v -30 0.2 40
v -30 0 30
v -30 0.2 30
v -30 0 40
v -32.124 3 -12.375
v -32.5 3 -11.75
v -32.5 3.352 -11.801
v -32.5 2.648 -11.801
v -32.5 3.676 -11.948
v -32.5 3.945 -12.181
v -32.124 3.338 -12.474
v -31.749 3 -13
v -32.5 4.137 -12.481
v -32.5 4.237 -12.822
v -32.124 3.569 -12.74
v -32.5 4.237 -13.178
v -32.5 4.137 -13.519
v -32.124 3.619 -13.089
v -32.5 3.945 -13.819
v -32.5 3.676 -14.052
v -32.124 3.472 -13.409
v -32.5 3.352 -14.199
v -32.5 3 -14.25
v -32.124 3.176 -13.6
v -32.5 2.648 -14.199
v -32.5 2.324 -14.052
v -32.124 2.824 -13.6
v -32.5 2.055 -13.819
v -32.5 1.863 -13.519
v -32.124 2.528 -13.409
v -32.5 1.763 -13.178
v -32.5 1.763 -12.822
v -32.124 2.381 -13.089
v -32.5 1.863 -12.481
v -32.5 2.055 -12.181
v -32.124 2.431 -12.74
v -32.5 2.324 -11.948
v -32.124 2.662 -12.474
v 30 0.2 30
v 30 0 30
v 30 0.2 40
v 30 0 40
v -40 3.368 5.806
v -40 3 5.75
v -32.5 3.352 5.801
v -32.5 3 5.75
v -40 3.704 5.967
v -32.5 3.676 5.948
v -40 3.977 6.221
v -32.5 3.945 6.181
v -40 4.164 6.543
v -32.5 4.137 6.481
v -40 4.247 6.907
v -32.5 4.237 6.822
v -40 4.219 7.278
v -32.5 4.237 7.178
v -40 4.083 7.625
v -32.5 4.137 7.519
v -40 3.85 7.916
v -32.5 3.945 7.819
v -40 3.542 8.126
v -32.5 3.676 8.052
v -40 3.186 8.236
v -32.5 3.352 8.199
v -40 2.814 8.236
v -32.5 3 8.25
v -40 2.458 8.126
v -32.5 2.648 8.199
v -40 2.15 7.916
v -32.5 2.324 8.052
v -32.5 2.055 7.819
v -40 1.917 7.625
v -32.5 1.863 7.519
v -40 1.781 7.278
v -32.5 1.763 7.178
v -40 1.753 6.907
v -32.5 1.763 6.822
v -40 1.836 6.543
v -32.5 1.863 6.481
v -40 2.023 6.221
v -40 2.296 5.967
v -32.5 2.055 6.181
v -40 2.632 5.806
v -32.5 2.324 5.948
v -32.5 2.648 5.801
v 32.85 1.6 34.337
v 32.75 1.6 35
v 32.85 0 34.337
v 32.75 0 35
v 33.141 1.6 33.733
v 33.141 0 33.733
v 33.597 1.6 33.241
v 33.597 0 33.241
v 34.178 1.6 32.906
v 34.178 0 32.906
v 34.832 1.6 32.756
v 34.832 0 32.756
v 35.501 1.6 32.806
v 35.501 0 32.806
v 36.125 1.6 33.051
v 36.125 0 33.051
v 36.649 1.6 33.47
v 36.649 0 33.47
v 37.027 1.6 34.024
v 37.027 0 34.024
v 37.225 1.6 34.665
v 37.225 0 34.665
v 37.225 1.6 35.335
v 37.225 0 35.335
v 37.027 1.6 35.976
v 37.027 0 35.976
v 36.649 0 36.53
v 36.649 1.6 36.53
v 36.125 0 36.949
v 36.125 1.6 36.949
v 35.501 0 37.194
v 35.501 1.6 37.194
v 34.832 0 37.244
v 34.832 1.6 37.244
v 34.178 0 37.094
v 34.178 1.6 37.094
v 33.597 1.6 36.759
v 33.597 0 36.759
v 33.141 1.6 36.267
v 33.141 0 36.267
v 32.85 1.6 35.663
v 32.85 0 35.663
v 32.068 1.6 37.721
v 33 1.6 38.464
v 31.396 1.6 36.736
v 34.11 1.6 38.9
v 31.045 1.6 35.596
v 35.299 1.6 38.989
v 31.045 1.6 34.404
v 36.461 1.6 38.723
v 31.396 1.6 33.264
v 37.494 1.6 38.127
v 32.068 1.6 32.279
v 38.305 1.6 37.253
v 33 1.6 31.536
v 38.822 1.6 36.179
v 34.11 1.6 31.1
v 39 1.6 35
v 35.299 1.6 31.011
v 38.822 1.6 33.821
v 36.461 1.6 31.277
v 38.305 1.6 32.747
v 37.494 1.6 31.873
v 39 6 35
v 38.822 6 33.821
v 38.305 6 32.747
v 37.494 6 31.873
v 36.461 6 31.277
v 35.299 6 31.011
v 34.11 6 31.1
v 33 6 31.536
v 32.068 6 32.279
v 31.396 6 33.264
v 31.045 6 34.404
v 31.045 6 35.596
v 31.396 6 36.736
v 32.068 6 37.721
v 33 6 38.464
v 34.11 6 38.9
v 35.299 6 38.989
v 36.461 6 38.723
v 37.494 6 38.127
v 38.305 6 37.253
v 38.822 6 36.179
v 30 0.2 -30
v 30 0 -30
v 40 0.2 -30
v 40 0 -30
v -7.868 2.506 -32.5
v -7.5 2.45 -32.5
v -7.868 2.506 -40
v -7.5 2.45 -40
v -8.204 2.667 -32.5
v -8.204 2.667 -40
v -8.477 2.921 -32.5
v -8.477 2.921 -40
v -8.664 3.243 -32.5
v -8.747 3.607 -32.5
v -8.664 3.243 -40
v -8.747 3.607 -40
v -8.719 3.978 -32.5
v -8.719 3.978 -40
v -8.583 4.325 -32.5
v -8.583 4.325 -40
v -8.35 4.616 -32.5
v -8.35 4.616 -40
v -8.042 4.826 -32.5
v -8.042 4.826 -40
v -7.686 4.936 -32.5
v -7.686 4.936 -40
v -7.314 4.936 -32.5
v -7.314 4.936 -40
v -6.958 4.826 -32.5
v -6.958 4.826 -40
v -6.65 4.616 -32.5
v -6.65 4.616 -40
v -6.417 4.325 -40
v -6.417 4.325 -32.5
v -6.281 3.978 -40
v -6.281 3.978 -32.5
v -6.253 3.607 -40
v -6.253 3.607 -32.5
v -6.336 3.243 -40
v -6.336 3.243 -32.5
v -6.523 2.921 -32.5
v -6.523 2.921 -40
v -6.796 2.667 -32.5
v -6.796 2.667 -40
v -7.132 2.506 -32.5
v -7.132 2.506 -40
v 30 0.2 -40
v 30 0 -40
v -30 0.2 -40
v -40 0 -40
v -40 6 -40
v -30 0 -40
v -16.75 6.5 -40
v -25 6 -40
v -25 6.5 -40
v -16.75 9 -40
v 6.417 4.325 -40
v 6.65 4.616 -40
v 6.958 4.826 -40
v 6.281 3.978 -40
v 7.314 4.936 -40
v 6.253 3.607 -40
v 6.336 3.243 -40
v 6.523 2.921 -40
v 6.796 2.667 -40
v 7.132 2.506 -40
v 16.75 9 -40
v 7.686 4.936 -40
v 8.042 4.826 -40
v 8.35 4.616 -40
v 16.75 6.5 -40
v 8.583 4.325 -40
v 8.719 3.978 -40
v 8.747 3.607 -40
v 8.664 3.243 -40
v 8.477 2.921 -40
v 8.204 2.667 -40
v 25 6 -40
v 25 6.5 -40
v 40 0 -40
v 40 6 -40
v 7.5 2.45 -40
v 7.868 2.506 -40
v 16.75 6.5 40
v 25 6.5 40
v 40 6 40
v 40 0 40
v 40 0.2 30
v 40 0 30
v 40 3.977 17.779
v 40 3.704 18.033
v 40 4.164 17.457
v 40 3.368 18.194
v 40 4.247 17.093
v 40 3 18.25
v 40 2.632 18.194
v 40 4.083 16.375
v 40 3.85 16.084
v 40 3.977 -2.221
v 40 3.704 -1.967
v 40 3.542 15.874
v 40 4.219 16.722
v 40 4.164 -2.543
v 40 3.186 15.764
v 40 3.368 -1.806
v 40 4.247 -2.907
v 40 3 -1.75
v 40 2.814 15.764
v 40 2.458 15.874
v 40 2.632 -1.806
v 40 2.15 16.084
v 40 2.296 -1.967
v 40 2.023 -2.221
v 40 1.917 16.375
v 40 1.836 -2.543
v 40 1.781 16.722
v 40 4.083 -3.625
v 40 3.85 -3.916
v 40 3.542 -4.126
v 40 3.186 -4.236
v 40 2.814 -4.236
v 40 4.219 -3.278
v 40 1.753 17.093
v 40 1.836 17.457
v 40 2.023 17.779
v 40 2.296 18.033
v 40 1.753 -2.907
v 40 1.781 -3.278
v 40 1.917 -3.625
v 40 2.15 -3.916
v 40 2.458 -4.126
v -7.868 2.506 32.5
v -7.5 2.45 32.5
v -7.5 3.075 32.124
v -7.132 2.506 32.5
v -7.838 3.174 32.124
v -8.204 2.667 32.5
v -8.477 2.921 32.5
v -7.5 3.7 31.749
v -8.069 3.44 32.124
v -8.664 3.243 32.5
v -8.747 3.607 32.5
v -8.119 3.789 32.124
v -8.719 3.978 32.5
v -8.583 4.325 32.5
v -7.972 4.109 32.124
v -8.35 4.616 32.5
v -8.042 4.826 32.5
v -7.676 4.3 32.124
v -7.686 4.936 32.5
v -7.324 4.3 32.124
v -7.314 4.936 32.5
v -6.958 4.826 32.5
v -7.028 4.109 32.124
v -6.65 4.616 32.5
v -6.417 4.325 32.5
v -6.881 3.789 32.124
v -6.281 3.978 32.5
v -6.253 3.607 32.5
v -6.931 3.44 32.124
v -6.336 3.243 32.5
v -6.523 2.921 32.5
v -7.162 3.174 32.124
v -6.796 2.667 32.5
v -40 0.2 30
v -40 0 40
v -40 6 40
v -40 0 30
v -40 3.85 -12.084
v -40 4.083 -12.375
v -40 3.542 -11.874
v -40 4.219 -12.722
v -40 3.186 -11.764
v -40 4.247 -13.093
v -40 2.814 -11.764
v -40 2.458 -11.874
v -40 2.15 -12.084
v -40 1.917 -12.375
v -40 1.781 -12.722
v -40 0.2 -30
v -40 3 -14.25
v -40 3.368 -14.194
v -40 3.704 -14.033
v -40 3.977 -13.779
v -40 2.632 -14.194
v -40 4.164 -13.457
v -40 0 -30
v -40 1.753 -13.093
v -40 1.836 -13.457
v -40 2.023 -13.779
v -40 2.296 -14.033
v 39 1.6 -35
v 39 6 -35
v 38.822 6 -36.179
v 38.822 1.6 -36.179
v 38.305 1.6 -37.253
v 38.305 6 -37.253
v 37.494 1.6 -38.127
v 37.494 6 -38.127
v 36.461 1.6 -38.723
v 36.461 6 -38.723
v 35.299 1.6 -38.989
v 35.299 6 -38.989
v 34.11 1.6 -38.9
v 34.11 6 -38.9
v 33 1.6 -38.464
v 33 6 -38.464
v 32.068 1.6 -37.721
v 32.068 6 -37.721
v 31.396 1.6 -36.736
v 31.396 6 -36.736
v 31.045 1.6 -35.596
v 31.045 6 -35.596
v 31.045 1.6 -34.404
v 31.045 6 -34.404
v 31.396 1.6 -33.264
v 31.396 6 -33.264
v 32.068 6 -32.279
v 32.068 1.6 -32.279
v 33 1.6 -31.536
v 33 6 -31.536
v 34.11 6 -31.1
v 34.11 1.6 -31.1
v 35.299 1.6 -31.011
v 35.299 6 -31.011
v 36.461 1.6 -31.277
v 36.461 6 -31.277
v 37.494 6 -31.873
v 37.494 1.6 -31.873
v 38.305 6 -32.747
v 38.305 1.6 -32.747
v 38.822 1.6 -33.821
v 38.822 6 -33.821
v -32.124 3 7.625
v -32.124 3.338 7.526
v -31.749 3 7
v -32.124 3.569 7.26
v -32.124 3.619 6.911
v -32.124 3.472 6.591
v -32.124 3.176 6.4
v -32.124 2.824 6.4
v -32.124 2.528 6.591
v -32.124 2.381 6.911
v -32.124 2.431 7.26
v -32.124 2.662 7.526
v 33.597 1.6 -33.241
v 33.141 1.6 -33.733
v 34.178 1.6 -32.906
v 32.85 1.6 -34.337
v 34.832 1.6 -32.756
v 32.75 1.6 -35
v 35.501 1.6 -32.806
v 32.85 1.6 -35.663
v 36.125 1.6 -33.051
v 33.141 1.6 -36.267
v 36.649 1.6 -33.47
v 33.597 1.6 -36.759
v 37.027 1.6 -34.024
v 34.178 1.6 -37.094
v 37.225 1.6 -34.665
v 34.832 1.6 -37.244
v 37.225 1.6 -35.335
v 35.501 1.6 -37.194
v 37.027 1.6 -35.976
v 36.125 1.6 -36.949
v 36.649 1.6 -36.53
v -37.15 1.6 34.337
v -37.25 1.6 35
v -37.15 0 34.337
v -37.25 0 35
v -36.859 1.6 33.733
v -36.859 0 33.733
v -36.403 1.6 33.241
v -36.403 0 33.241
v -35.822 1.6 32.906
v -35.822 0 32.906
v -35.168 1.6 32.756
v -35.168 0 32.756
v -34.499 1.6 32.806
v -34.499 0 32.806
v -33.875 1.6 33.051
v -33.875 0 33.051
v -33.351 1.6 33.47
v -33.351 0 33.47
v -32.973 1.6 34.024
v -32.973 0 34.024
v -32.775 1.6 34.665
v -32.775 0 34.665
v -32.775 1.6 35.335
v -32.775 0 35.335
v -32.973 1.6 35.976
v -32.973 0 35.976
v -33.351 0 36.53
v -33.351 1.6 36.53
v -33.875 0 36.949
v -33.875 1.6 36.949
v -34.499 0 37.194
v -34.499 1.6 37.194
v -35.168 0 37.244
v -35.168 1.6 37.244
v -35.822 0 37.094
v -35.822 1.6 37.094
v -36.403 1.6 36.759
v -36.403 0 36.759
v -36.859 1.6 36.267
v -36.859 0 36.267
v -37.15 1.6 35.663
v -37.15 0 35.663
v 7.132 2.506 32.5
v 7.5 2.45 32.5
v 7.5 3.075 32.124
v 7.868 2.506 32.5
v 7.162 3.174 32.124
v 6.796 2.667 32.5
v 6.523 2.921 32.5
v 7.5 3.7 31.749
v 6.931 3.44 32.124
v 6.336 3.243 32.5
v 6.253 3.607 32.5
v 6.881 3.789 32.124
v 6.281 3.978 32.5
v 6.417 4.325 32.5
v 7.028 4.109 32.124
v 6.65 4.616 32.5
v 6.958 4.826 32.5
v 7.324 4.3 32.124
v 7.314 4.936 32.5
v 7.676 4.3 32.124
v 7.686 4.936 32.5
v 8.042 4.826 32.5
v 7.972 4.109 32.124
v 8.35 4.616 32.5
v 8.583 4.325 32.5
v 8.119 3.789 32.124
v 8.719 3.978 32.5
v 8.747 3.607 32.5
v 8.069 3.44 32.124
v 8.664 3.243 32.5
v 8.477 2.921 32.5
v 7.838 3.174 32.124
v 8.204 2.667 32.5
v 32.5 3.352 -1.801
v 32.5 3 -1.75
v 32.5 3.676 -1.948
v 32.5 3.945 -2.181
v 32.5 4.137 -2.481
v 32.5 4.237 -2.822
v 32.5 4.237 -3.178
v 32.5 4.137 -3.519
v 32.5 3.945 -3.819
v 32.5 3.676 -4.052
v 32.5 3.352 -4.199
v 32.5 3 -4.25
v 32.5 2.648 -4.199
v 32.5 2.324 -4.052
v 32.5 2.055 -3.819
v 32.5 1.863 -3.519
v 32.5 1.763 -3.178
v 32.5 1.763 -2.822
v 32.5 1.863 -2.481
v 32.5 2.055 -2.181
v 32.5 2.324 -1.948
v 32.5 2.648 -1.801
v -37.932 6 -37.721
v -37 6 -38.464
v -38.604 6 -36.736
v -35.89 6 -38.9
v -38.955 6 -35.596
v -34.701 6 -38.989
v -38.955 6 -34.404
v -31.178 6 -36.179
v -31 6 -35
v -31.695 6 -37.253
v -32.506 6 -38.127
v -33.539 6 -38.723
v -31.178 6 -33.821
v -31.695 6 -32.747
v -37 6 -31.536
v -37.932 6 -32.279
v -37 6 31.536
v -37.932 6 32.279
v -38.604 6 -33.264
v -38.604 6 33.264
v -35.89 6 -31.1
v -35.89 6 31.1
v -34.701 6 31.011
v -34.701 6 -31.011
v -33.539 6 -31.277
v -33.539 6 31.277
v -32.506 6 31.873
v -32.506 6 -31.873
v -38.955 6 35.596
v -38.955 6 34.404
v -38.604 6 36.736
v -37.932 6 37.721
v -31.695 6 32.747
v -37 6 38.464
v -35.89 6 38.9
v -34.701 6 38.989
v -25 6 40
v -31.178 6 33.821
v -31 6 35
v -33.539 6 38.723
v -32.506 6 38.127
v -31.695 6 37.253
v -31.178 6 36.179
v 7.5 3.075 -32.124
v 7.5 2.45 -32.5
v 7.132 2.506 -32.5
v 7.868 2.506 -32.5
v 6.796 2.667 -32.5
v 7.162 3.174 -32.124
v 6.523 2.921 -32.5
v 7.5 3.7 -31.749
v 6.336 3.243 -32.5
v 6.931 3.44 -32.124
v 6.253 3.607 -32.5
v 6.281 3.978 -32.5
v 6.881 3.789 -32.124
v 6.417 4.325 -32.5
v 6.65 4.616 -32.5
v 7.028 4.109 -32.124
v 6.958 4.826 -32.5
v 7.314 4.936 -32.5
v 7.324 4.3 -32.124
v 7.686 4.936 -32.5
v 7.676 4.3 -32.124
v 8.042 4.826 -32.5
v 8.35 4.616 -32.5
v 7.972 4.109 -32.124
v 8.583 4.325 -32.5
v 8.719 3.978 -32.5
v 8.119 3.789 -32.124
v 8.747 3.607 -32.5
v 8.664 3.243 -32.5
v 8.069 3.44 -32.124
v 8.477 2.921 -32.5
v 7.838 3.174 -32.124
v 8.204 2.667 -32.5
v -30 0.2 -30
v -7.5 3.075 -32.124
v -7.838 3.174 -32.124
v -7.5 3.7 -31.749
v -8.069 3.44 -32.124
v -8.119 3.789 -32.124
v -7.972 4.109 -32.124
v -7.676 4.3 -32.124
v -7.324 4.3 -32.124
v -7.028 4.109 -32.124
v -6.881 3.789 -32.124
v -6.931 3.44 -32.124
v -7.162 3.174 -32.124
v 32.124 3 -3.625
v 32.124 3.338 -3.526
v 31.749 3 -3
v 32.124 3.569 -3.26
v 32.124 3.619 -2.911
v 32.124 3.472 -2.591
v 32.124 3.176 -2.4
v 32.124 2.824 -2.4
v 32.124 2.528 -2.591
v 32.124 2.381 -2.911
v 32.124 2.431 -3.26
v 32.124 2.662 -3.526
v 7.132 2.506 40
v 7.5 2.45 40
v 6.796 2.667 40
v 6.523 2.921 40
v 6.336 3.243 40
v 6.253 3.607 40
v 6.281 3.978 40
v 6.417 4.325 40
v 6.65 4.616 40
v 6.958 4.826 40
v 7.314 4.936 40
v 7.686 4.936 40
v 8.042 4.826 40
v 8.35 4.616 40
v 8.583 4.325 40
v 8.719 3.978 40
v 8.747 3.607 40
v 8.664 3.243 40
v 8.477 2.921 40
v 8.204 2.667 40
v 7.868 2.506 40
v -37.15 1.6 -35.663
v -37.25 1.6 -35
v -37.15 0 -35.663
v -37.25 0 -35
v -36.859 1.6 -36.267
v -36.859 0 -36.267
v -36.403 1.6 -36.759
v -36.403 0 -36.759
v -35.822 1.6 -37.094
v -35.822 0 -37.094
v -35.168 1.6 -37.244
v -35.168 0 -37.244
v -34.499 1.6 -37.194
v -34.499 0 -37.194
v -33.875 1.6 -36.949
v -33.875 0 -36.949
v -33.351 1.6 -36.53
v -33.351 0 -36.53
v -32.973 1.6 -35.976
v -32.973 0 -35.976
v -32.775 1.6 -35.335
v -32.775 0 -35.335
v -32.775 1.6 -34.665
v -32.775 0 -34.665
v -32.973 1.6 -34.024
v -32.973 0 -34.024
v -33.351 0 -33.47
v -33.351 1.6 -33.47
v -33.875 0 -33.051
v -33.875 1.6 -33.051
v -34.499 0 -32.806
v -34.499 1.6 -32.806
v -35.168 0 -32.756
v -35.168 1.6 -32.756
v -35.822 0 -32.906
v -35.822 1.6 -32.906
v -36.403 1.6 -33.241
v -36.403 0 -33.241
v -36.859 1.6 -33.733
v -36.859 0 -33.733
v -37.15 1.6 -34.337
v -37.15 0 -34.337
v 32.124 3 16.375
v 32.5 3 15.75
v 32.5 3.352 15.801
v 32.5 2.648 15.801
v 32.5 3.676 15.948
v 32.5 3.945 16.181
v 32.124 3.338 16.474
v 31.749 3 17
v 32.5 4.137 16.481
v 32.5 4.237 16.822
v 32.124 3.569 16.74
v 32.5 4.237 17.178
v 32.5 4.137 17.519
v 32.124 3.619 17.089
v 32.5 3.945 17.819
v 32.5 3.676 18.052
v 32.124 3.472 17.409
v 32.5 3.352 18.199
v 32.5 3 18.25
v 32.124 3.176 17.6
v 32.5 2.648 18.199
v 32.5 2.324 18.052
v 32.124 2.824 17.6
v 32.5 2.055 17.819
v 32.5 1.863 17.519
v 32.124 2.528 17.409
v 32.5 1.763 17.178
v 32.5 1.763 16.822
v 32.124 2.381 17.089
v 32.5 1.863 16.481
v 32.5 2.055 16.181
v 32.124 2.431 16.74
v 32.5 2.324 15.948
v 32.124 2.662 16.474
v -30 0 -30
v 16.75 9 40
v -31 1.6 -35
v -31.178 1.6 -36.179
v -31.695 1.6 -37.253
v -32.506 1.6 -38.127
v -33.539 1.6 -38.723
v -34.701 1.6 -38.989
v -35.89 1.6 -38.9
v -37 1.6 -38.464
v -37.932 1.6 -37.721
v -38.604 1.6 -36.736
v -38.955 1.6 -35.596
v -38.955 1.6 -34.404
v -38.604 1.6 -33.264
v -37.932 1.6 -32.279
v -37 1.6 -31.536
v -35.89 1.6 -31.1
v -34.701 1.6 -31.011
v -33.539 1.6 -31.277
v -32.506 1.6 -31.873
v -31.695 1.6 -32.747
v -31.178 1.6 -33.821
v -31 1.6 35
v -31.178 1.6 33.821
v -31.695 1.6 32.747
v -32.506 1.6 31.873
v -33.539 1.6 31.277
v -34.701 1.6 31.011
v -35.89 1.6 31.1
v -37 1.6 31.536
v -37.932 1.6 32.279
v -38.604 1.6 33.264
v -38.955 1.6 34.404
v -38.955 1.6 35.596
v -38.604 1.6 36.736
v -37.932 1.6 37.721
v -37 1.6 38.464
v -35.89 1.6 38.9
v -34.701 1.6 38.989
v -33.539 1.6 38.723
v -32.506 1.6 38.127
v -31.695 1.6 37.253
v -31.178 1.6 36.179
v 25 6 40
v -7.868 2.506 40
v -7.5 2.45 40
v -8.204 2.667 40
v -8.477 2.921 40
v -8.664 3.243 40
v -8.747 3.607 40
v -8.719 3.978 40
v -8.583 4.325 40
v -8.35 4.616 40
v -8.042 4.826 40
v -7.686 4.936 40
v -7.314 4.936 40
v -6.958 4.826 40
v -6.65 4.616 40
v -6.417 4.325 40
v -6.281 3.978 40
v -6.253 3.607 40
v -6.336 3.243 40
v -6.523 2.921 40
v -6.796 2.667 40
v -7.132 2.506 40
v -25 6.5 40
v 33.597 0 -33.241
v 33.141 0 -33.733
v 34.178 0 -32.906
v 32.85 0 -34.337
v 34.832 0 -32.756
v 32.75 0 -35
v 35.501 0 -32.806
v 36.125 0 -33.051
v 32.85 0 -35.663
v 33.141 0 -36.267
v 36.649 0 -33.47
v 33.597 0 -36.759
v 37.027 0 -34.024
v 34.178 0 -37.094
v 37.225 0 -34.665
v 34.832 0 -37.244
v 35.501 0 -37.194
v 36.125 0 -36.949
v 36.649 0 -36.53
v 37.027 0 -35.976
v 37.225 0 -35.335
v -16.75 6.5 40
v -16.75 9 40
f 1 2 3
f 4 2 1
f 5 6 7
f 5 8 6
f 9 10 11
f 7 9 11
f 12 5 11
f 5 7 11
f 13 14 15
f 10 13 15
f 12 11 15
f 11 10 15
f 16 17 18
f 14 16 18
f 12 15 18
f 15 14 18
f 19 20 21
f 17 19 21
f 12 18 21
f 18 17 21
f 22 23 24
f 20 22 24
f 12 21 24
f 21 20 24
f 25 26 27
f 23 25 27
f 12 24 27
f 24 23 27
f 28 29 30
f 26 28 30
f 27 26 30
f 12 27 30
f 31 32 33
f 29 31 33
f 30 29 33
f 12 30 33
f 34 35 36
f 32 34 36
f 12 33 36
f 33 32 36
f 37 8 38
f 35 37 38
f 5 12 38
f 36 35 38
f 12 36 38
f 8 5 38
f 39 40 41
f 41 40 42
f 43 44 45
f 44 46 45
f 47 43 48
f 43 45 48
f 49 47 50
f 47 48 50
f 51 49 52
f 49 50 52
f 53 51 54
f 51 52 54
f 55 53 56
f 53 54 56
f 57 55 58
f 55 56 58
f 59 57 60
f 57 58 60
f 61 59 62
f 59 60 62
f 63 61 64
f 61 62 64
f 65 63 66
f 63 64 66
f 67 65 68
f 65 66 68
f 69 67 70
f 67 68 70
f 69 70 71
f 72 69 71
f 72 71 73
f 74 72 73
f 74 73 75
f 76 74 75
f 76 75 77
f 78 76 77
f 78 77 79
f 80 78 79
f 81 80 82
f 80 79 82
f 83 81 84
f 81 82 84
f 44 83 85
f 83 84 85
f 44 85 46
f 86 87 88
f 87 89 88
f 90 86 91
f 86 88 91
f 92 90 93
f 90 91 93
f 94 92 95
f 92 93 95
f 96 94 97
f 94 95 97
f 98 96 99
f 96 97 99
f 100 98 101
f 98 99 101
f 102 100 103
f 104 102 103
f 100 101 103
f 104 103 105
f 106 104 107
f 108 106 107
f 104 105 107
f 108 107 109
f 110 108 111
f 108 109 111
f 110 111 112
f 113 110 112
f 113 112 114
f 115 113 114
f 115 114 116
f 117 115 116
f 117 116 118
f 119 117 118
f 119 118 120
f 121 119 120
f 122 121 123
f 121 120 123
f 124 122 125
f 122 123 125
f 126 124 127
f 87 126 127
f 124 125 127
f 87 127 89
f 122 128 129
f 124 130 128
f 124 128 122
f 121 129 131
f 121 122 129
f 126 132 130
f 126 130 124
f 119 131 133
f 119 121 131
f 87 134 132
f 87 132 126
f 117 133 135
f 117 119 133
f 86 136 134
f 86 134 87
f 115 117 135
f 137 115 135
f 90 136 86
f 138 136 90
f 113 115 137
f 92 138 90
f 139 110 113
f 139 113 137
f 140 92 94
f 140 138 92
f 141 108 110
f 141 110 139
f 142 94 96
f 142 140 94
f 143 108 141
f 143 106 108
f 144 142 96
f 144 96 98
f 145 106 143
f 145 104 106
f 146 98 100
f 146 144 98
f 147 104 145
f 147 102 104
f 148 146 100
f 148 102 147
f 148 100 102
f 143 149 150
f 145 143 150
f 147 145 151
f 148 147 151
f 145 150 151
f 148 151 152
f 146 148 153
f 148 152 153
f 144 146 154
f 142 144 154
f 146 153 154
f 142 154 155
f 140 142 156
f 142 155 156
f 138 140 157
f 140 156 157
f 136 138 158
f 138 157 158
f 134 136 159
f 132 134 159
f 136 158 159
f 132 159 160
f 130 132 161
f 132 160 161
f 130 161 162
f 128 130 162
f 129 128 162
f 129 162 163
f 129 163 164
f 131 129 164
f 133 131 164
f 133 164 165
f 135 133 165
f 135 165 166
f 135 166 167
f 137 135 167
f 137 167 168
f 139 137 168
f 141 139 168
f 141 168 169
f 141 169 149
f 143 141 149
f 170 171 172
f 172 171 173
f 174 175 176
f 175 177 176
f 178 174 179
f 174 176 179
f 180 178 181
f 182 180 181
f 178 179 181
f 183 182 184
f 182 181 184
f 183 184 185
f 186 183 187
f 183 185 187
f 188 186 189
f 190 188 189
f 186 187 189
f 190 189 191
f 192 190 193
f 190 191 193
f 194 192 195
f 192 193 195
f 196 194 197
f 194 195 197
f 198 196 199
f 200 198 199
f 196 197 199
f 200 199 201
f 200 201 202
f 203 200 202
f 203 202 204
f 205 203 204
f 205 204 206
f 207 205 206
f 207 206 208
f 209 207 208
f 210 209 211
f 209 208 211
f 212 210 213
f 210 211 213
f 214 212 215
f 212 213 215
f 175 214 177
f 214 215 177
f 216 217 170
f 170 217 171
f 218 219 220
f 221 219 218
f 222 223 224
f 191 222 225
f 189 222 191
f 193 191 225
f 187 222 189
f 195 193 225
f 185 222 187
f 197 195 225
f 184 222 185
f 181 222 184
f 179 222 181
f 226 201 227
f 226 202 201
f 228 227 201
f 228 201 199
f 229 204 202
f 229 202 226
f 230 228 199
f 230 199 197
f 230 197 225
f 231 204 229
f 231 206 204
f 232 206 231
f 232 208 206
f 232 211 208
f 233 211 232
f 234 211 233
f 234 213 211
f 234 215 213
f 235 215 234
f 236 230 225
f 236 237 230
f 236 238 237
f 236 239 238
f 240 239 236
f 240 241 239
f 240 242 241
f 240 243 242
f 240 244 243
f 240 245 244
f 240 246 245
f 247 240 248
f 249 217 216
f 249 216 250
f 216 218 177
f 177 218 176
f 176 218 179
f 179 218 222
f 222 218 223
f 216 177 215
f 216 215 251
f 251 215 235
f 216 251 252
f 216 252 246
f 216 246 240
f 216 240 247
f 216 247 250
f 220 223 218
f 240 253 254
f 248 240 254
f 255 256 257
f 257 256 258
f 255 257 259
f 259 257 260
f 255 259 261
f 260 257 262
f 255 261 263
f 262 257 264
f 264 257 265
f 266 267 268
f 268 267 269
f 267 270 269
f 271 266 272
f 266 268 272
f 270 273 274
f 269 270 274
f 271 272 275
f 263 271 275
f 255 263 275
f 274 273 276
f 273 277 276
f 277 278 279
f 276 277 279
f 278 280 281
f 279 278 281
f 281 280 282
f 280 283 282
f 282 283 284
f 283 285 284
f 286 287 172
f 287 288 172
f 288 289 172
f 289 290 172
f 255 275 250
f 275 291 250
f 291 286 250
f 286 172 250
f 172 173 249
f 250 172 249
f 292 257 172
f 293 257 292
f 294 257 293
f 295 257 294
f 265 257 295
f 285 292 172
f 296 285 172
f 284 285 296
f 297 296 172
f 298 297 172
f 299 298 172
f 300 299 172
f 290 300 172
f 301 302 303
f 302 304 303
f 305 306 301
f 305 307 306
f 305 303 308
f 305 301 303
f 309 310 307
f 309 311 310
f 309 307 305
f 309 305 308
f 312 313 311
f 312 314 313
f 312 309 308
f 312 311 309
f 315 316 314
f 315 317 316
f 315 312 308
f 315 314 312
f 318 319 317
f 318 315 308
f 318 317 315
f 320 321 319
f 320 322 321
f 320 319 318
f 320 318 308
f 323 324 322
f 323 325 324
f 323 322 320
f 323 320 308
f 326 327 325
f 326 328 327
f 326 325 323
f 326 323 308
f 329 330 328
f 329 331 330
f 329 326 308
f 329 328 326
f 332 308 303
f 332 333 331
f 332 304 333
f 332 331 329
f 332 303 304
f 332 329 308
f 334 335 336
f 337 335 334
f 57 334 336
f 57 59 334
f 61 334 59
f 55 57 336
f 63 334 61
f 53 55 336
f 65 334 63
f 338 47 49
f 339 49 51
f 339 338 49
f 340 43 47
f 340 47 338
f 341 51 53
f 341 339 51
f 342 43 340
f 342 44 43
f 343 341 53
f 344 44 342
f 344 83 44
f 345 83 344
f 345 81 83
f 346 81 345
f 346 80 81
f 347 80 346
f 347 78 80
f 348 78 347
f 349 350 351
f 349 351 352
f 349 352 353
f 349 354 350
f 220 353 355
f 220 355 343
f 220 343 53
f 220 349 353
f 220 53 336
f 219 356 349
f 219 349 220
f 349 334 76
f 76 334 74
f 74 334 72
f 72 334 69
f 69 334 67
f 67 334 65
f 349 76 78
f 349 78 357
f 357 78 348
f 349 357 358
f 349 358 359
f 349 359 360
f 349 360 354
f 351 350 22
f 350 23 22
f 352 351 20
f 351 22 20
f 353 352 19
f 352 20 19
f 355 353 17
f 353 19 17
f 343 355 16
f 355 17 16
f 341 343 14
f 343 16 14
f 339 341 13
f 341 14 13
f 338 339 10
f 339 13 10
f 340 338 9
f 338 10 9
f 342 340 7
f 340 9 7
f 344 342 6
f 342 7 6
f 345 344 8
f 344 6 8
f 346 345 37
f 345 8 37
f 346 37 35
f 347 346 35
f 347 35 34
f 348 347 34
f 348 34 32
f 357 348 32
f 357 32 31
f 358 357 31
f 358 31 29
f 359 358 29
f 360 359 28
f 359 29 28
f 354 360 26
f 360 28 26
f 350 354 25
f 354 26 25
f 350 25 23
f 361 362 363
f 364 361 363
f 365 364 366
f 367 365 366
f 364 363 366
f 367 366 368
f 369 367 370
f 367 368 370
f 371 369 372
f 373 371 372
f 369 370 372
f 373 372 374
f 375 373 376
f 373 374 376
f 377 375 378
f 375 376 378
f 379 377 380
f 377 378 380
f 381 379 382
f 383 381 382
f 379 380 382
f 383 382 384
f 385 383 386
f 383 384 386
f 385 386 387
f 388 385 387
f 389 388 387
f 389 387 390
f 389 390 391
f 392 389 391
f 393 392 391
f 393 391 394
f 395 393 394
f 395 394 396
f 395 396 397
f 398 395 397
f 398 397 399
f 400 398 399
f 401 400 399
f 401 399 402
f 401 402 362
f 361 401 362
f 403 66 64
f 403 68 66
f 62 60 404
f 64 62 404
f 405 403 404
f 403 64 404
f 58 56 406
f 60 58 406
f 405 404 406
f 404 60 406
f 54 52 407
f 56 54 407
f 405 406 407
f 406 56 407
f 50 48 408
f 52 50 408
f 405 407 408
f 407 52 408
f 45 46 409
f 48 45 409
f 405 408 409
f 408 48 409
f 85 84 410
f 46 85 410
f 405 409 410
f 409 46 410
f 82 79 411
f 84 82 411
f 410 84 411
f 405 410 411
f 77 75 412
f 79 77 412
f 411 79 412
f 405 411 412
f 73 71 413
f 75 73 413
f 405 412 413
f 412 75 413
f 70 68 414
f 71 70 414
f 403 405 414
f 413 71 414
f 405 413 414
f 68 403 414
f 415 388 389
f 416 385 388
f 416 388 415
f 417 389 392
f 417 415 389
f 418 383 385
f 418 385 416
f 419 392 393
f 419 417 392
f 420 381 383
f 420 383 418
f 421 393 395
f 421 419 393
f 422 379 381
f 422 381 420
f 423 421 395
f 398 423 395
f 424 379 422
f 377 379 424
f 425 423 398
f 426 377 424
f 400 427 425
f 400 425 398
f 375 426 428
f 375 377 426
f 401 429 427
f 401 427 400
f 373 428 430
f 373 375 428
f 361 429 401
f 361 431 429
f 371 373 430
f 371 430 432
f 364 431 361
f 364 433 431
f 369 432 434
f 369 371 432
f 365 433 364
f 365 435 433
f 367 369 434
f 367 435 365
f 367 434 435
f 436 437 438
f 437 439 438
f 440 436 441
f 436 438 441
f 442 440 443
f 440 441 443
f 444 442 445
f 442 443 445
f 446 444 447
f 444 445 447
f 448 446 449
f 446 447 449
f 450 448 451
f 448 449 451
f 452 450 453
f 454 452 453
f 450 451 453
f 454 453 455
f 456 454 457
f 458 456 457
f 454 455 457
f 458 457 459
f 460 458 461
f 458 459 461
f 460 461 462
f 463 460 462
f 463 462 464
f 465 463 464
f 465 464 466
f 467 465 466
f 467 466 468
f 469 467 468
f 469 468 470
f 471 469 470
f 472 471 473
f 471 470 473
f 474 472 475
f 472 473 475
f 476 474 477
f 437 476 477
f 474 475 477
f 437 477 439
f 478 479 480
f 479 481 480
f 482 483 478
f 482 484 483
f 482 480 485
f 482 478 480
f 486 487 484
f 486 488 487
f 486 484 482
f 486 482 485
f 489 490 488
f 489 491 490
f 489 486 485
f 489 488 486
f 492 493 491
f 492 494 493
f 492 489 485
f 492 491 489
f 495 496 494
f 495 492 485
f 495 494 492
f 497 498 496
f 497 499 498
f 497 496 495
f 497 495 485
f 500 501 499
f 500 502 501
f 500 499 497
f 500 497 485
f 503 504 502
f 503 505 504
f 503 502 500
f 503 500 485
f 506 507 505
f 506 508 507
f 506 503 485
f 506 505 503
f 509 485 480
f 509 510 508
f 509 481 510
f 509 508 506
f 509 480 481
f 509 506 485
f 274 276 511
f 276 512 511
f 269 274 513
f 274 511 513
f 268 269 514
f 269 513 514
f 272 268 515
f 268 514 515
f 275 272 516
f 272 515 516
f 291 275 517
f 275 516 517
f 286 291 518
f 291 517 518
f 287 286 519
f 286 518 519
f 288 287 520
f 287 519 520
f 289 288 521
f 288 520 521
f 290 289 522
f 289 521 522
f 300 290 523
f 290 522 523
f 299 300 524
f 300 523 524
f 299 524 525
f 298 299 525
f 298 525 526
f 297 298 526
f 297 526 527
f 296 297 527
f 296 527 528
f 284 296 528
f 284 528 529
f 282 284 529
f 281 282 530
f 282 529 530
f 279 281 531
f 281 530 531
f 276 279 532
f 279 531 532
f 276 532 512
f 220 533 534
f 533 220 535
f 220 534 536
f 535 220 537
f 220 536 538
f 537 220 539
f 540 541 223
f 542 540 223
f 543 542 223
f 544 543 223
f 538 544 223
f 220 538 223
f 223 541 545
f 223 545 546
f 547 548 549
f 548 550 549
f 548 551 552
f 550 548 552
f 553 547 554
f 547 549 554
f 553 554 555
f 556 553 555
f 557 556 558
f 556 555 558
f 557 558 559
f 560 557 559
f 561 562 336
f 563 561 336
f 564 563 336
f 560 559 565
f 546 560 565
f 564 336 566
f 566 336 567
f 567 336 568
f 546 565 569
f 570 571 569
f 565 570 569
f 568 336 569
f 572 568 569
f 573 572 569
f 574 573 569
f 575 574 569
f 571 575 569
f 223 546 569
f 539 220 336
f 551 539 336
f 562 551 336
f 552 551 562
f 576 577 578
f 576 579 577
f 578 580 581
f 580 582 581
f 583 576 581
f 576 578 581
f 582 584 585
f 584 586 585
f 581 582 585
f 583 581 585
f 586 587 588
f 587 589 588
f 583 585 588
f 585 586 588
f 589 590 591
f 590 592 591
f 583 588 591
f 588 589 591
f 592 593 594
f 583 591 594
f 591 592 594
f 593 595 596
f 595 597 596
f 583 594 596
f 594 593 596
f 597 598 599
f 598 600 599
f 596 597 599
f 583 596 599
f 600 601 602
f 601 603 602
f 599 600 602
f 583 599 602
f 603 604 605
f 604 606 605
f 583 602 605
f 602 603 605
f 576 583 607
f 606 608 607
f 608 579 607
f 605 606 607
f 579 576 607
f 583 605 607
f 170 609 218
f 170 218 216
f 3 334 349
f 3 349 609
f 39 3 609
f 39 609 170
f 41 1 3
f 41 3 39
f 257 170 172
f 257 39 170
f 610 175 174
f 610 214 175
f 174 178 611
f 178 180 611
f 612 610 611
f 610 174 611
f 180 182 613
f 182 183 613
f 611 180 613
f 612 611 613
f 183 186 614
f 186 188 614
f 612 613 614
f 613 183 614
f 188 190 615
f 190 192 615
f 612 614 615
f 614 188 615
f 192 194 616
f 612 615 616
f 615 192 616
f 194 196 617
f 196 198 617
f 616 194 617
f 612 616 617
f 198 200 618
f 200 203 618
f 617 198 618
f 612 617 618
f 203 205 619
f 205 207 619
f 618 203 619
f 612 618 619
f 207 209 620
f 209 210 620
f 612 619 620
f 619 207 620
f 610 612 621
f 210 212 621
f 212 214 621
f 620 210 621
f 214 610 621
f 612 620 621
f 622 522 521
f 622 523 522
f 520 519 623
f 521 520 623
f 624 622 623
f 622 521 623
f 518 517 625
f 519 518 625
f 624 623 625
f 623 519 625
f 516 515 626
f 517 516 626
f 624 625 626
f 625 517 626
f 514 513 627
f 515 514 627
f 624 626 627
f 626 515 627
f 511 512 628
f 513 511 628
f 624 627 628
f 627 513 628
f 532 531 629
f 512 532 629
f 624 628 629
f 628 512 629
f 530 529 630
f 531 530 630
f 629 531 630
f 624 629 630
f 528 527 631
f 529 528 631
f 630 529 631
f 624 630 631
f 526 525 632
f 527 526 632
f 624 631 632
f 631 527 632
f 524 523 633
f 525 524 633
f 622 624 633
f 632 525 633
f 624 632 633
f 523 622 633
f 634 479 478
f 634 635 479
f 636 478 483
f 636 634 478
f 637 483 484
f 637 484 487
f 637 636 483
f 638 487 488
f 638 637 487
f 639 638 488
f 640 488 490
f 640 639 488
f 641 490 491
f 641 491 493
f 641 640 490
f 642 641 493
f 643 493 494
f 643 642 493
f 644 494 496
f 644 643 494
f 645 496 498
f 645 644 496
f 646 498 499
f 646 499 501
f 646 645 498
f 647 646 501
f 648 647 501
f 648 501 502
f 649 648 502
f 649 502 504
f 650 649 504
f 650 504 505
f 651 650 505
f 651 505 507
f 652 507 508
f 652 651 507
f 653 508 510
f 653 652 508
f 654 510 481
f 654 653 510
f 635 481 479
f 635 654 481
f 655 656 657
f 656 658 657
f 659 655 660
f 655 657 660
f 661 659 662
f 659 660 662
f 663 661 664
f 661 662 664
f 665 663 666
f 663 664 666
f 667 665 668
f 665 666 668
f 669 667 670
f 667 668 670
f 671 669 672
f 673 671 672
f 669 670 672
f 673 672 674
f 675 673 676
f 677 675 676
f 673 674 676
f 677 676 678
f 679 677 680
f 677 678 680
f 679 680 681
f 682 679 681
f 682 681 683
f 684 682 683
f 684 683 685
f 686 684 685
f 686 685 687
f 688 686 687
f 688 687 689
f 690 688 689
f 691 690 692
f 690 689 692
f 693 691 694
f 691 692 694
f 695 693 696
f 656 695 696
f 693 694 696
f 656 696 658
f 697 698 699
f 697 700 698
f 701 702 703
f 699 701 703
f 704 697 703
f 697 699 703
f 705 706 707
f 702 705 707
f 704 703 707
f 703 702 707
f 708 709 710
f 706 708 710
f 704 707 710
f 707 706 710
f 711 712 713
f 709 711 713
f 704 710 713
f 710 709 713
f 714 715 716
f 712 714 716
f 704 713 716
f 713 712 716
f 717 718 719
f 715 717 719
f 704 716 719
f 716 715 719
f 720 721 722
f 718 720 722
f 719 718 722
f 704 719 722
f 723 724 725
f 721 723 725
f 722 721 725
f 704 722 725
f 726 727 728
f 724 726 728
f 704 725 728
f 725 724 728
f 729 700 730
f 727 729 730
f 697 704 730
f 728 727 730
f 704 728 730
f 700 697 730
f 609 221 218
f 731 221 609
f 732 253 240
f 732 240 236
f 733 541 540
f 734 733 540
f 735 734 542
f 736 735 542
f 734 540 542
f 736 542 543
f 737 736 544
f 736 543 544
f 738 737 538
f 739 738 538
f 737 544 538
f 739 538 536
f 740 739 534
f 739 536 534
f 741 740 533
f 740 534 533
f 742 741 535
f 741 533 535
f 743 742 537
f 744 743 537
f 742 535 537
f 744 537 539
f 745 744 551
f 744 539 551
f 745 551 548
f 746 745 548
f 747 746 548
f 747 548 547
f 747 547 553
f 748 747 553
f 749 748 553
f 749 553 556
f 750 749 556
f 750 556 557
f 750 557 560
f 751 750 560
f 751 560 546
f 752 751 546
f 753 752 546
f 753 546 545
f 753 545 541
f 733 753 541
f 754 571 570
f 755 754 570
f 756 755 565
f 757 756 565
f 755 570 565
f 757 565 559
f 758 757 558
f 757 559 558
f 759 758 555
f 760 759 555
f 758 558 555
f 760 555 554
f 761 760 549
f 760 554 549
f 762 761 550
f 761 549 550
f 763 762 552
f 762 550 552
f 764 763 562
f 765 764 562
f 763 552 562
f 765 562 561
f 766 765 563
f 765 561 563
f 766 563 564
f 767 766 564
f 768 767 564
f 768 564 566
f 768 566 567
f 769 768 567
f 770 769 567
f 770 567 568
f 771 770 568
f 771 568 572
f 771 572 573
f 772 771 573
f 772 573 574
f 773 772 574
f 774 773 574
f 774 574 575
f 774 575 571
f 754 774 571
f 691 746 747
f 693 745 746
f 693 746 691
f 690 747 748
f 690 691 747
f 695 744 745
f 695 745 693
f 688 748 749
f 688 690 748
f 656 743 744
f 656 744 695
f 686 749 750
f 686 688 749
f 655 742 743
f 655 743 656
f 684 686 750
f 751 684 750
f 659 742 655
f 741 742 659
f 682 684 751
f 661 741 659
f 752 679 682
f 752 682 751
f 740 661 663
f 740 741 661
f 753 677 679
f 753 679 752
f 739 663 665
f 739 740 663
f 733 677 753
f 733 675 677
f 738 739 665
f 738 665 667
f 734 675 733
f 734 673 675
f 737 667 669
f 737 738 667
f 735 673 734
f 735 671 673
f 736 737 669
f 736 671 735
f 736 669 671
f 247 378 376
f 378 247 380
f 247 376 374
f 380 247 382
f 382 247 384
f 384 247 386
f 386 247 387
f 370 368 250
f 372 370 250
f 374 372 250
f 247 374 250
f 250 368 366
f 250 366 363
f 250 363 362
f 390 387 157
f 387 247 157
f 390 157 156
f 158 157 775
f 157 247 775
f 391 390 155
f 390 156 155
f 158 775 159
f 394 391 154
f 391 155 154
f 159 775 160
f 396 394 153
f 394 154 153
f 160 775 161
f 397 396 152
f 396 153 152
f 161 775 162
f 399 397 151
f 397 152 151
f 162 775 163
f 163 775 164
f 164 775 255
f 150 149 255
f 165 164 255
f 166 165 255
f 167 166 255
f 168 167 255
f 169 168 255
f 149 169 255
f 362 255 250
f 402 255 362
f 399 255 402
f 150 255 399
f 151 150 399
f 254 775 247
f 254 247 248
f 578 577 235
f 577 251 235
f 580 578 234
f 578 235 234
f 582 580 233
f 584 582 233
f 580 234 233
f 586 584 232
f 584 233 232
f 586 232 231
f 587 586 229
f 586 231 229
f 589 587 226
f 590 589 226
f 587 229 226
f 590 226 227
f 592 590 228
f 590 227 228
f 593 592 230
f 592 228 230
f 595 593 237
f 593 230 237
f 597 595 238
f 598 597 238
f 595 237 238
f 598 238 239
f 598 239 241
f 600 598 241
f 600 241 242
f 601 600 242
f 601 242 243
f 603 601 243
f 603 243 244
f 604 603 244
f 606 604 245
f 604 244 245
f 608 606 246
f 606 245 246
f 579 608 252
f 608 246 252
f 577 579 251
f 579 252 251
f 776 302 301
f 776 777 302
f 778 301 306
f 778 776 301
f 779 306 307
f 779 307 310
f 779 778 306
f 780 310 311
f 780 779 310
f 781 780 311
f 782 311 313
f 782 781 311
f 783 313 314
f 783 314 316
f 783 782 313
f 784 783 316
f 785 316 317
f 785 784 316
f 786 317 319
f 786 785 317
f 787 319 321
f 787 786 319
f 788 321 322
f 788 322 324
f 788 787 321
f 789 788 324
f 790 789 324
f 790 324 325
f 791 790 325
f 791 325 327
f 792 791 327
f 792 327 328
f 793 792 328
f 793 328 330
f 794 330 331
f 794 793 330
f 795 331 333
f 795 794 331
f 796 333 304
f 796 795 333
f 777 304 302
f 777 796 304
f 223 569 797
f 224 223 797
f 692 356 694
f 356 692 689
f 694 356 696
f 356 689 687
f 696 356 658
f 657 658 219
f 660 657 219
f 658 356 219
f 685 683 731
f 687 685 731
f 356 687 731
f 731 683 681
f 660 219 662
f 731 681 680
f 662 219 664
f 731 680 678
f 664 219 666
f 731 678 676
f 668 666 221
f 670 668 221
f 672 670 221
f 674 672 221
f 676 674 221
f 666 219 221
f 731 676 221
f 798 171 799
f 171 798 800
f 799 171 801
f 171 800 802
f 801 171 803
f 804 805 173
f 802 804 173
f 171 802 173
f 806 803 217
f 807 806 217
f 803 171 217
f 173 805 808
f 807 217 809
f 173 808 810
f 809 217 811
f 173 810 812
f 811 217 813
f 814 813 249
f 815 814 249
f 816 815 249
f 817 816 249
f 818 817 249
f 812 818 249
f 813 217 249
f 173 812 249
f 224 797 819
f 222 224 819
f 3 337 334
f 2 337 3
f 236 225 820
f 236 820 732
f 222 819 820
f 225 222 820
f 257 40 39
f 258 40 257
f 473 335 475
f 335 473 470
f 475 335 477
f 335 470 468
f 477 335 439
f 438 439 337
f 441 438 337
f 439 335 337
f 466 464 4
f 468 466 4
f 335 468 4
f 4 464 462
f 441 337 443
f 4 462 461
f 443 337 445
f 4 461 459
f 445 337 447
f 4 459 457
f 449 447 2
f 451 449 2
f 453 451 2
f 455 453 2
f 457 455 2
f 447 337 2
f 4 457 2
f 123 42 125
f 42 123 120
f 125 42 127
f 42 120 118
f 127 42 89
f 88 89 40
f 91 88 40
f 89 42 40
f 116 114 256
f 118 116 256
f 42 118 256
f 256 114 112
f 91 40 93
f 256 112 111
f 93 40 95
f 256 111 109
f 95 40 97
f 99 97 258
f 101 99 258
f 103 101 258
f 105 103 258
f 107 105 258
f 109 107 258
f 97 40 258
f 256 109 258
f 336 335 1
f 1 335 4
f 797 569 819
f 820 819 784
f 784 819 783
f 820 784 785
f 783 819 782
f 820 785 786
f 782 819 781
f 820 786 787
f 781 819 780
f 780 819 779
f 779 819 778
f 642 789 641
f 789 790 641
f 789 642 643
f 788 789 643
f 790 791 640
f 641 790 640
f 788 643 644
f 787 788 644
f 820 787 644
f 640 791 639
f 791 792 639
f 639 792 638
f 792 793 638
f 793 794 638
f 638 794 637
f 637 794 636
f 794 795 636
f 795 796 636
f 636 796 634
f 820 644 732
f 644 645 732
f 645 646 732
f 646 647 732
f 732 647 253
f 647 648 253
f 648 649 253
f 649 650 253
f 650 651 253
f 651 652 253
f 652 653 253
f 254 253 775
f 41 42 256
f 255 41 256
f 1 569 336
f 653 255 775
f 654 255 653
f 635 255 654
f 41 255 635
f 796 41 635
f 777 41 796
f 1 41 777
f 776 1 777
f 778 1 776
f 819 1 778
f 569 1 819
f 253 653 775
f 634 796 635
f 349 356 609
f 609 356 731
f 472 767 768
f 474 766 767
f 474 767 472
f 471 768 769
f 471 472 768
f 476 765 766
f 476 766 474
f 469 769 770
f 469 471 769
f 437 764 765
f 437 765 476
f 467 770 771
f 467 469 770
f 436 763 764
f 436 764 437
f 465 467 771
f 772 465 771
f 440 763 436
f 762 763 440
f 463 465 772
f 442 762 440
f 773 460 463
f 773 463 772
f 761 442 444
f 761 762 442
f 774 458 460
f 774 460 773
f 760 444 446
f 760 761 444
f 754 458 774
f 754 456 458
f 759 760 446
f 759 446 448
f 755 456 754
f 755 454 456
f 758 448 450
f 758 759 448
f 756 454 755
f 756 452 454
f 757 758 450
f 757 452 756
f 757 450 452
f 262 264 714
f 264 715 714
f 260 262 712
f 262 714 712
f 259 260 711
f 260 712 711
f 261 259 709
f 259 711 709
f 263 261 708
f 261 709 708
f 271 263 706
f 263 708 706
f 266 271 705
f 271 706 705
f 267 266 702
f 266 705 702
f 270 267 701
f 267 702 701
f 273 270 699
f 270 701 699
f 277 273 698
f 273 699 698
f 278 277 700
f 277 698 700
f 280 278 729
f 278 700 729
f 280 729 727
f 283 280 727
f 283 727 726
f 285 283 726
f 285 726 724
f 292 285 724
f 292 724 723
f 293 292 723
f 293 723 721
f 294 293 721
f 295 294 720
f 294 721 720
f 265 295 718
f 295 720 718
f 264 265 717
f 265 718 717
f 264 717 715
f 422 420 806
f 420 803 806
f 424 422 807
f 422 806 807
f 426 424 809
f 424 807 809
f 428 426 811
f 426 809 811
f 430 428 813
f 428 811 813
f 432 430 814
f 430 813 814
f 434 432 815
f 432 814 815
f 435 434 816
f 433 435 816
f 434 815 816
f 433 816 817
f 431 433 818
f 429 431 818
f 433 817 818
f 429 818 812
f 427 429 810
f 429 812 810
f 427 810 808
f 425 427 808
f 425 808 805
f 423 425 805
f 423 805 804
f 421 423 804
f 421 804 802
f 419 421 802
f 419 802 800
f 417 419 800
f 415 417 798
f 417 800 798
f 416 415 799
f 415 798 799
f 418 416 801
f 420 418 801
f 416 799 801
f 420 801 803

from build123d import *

# Parameters (mm, degrees)
SKETCH_1_W                  = 80
SKETCH_1_H                  = 80
EXTRUDE_1_DEPTH             = 9
SKETCH_2_W                  = 23.25
SKETCH_2_H                  = 2.5
CUT_EXTRUDE_1_DEPTH         = 90.894382472
SKETCH_10_W                 = 15
SKETCH_10_H                 = 0.5
CUT_EXTRUDE_3_DEPTH         = 90.894382472
HOLE_WIZARD_1_D             = 4.5
HOLE_WIZARD_1_CBORE_D       = 8
HOLE_WIZARD_1_CBORE_DEPTH   = 4.4
HOLE_WIZARD_M3_1_D          = 2.5
HOLE_WIZARD_M3_1_DEPTH      = 7.5
HOLE_WIZARD_M3_1_TIP        = 0.751075774
HOLE_WIZARD_M3_2_D          = 2.5
HOLE_WIZARD_M3_2_DEPTH      = 7.5
HOLE_WIZARD_M3_2_TIP        = 0.751075774
SKETCH_5_OUTSIDE_W          = 104.698
SKETCH_5_OUTSIDE_H          = 104.698
SKETCH_5_OUTSIDE_W_2        = 10
SKETCH_5_OUTSIDE_H_2        = 10
CUT_EXTRUDE_2_DEPTH         = 0.2
HOLE_WIZARD_M3_3_AT_2_COUNT = 2
HOLE_WIZARD_M3_3_AT_2_PITCH = 15


with BuildPart() as part:
    # 草图1 → 凸台-拉伸1 (new body)
    with BuildSketch(Plane(origin=(0, 0, 0), x_dir=(1, 0, 0), z_dir=(0, 1, 0))):
        Rectangle(SKETCH_1_W, SKETCH_1_H)
    extrude(amount=EXTRUDE_1_DEPTH)

    # 草图2 → 切除-拉伸1 (cut, through all)
    with BuildSketch(Plane.XY.offset(40)):
        with Locations((28.375, 7.75)):
            Rectangle(SKETCH_2_W, SKETCH_2_H)
        with Locations((-28.375, 7.75)):
            Rectangle(SKETCH_2_W, SKETCH_2_H)
    extrude(amount=-CUT_EXTRUDE_1_DEPTH, mode=Mode.SUBTRACT)

    # 草图10 → 切除-拉伸3 (cut, through all)
    with BuildSketch(Plane.XY.offset(40)):
        with Locations((32.5, 6.25)):
            Rectangle(SKETCH_10_W, SKETCH_10_H)
        with Locations((-32.5, 6.25)):
            Rectangle(SKETCH_10_W, SKETCH_10_H)
    extrude(amount=-CUT_EXTRUDE_3_DEPTH, mode=Mode.SUBTRACT)

    # 打孔尺寸根据内六角圆柱头螺钉的类型1 (through all)
    with Locations(Plane(origin=(-39.335611713, 6, 5.280516917), x_dir=(1, 0, 0), z_dir=(0, 1, 0))):
        with Locations((4.335611713, 40.280516917), (74.335611713, 40.280516917), (74.335611713, -29.719483083), (4.335611713, -29.719483083)):
            CounterBoreHole(HOLE_WIZARD_1_D / 2, HOLE_WIZARD_1_CBORE_D / 2, HOLE_WIZARD_1_CBORE_DEPTH)

    # M3 螺纹孔1
    with Locations(Plane.ZY.offset(40)):
        with Locations((7, 3), (-13, 3)):
            Hole(HOLE_WIZARD_M3_1_D / 2, depth=HOLE_WIZARD_M3_1_DEPTH)
            with Locations((0, 0, -(HOLE_WIZARD_M3_1_DEPTH + HOLE_WIZARD_M3_1_TIP / 2))):  # 118° drill point
                Cone(0, HOLE_WIZARD_M3_1_D / 2, HOLE_WIZARD_M3_1_TIP, mode=Mode.SUBTRACT)

    # M3 螺纹孔2
    with Locations(Plane(origin=(40, 0, 0), x_dir=(0, 0, -1), z_dir=(1, 0, 0))):
        with Locations((3, 3), (-17, 3)):
            Hole(HOLE_WIZARD_M3_2_D / 2, depth=HOLE_WIZARD_M3_2_DEPTH)
            with Locations((0, 0, -(HOLE_WIZARD_M3_2_DEPTH + HOLE_WIZARD_M3_2_TIP / 2))):  # 118° drill point
                Cone(0, HOLE_WIZARD_M3_2_D / 2, HOLE_WIZARD_M3_2_TIP, mode=Mode.SUBTRACT)

    # 草图5 outside → 切除-拉伸2 (cut)
    with BuildSketch(Plane.XZ):
        Rectangle(SKETCH_5_OUTSIDE_W, SKETCH_5_OUTSIDE_H)
        with Locations((35, 35)):
            Rectangle(SKETCH_5_OUTSIDE_W_2, SKETCH_5_OUTSIDE_H_2, mode=Mode.SUBTRACT)
        with Locations((-35, 35)):
            Rectangle(SKETCH_5_OUTSIDE_W_2, SKETCH_5_OUTSIDE_H_2, mode=Mode.SUBTRACT)
        with Locations((35, -35)):
            Rectangle(SKETCH_5_OUTSIDE_W_2, SKETCH_5_OUTSIDE_H_2, mode=Mode.SUBTRACT)
        with Locations((-35, -35)):
            Rectangle(SKETCH_5_OUTSIDE_W_2, SKETCH_5_OUTSIDE_H_2, mode=Mode.SUBTRACT)
    extrude(amount=-CUT_EXTRUDE_2_DEPTH, mode=Mode.SUBTRACT)

    # 草图11 → M3 螺纹孔3 (revolve, cut)
    with BuildSketch(Plane(origin=(-7.5, 3.7, 40), x_dir=(0, -1, 0), z_dir=(1, 0, 0))):
        Polygon((0, 0), (0, 8.251075774), (1.25, 7.5), (1.25, 0), align=None)
    hole_wizard_m3_3 = revolve(axis=Axis((-7.5, 3.7, 46.35), (0, 0, -1)), mode=Mode.SUBTRACT)

    # M3 螺纹孔3 at 2: M3 螺纹孔3 ×2
    with Locations(*[(i * HOLE_WIZARD_M3_3_AT_2_PITCH, 0, 0) for i in range(1, HOLE_WIZARD_M3_3_AT_2_COUNT)]):
        add(hole_wizard_m3_3, mode=Mode.SUBTRACT)

    # 镜向1: M3 螺纹孔3 across plane
    add(hole_wizard_m3_3.mirror(Plane.XY), mode=Mode.SUBTRACT)

    # 镜向1 copy 1 sketch → 镜向1 copy 1 (revolve, cut)
    with BuildSketch(Plane(origin=(7.5, 3.7, -40), x_dir=(0, -1, 0), z_dir=(1, 0, 0))):
        Polygon((0, 0), (0, -8.251075774), (1.25, -7.5), (1.25, 0), align=None)
    revolve(axis=Axis((7.5, 3.7, -46.35), (0, 0, -1)), mode=Mode.SUBTRACT)


solid = part.part
